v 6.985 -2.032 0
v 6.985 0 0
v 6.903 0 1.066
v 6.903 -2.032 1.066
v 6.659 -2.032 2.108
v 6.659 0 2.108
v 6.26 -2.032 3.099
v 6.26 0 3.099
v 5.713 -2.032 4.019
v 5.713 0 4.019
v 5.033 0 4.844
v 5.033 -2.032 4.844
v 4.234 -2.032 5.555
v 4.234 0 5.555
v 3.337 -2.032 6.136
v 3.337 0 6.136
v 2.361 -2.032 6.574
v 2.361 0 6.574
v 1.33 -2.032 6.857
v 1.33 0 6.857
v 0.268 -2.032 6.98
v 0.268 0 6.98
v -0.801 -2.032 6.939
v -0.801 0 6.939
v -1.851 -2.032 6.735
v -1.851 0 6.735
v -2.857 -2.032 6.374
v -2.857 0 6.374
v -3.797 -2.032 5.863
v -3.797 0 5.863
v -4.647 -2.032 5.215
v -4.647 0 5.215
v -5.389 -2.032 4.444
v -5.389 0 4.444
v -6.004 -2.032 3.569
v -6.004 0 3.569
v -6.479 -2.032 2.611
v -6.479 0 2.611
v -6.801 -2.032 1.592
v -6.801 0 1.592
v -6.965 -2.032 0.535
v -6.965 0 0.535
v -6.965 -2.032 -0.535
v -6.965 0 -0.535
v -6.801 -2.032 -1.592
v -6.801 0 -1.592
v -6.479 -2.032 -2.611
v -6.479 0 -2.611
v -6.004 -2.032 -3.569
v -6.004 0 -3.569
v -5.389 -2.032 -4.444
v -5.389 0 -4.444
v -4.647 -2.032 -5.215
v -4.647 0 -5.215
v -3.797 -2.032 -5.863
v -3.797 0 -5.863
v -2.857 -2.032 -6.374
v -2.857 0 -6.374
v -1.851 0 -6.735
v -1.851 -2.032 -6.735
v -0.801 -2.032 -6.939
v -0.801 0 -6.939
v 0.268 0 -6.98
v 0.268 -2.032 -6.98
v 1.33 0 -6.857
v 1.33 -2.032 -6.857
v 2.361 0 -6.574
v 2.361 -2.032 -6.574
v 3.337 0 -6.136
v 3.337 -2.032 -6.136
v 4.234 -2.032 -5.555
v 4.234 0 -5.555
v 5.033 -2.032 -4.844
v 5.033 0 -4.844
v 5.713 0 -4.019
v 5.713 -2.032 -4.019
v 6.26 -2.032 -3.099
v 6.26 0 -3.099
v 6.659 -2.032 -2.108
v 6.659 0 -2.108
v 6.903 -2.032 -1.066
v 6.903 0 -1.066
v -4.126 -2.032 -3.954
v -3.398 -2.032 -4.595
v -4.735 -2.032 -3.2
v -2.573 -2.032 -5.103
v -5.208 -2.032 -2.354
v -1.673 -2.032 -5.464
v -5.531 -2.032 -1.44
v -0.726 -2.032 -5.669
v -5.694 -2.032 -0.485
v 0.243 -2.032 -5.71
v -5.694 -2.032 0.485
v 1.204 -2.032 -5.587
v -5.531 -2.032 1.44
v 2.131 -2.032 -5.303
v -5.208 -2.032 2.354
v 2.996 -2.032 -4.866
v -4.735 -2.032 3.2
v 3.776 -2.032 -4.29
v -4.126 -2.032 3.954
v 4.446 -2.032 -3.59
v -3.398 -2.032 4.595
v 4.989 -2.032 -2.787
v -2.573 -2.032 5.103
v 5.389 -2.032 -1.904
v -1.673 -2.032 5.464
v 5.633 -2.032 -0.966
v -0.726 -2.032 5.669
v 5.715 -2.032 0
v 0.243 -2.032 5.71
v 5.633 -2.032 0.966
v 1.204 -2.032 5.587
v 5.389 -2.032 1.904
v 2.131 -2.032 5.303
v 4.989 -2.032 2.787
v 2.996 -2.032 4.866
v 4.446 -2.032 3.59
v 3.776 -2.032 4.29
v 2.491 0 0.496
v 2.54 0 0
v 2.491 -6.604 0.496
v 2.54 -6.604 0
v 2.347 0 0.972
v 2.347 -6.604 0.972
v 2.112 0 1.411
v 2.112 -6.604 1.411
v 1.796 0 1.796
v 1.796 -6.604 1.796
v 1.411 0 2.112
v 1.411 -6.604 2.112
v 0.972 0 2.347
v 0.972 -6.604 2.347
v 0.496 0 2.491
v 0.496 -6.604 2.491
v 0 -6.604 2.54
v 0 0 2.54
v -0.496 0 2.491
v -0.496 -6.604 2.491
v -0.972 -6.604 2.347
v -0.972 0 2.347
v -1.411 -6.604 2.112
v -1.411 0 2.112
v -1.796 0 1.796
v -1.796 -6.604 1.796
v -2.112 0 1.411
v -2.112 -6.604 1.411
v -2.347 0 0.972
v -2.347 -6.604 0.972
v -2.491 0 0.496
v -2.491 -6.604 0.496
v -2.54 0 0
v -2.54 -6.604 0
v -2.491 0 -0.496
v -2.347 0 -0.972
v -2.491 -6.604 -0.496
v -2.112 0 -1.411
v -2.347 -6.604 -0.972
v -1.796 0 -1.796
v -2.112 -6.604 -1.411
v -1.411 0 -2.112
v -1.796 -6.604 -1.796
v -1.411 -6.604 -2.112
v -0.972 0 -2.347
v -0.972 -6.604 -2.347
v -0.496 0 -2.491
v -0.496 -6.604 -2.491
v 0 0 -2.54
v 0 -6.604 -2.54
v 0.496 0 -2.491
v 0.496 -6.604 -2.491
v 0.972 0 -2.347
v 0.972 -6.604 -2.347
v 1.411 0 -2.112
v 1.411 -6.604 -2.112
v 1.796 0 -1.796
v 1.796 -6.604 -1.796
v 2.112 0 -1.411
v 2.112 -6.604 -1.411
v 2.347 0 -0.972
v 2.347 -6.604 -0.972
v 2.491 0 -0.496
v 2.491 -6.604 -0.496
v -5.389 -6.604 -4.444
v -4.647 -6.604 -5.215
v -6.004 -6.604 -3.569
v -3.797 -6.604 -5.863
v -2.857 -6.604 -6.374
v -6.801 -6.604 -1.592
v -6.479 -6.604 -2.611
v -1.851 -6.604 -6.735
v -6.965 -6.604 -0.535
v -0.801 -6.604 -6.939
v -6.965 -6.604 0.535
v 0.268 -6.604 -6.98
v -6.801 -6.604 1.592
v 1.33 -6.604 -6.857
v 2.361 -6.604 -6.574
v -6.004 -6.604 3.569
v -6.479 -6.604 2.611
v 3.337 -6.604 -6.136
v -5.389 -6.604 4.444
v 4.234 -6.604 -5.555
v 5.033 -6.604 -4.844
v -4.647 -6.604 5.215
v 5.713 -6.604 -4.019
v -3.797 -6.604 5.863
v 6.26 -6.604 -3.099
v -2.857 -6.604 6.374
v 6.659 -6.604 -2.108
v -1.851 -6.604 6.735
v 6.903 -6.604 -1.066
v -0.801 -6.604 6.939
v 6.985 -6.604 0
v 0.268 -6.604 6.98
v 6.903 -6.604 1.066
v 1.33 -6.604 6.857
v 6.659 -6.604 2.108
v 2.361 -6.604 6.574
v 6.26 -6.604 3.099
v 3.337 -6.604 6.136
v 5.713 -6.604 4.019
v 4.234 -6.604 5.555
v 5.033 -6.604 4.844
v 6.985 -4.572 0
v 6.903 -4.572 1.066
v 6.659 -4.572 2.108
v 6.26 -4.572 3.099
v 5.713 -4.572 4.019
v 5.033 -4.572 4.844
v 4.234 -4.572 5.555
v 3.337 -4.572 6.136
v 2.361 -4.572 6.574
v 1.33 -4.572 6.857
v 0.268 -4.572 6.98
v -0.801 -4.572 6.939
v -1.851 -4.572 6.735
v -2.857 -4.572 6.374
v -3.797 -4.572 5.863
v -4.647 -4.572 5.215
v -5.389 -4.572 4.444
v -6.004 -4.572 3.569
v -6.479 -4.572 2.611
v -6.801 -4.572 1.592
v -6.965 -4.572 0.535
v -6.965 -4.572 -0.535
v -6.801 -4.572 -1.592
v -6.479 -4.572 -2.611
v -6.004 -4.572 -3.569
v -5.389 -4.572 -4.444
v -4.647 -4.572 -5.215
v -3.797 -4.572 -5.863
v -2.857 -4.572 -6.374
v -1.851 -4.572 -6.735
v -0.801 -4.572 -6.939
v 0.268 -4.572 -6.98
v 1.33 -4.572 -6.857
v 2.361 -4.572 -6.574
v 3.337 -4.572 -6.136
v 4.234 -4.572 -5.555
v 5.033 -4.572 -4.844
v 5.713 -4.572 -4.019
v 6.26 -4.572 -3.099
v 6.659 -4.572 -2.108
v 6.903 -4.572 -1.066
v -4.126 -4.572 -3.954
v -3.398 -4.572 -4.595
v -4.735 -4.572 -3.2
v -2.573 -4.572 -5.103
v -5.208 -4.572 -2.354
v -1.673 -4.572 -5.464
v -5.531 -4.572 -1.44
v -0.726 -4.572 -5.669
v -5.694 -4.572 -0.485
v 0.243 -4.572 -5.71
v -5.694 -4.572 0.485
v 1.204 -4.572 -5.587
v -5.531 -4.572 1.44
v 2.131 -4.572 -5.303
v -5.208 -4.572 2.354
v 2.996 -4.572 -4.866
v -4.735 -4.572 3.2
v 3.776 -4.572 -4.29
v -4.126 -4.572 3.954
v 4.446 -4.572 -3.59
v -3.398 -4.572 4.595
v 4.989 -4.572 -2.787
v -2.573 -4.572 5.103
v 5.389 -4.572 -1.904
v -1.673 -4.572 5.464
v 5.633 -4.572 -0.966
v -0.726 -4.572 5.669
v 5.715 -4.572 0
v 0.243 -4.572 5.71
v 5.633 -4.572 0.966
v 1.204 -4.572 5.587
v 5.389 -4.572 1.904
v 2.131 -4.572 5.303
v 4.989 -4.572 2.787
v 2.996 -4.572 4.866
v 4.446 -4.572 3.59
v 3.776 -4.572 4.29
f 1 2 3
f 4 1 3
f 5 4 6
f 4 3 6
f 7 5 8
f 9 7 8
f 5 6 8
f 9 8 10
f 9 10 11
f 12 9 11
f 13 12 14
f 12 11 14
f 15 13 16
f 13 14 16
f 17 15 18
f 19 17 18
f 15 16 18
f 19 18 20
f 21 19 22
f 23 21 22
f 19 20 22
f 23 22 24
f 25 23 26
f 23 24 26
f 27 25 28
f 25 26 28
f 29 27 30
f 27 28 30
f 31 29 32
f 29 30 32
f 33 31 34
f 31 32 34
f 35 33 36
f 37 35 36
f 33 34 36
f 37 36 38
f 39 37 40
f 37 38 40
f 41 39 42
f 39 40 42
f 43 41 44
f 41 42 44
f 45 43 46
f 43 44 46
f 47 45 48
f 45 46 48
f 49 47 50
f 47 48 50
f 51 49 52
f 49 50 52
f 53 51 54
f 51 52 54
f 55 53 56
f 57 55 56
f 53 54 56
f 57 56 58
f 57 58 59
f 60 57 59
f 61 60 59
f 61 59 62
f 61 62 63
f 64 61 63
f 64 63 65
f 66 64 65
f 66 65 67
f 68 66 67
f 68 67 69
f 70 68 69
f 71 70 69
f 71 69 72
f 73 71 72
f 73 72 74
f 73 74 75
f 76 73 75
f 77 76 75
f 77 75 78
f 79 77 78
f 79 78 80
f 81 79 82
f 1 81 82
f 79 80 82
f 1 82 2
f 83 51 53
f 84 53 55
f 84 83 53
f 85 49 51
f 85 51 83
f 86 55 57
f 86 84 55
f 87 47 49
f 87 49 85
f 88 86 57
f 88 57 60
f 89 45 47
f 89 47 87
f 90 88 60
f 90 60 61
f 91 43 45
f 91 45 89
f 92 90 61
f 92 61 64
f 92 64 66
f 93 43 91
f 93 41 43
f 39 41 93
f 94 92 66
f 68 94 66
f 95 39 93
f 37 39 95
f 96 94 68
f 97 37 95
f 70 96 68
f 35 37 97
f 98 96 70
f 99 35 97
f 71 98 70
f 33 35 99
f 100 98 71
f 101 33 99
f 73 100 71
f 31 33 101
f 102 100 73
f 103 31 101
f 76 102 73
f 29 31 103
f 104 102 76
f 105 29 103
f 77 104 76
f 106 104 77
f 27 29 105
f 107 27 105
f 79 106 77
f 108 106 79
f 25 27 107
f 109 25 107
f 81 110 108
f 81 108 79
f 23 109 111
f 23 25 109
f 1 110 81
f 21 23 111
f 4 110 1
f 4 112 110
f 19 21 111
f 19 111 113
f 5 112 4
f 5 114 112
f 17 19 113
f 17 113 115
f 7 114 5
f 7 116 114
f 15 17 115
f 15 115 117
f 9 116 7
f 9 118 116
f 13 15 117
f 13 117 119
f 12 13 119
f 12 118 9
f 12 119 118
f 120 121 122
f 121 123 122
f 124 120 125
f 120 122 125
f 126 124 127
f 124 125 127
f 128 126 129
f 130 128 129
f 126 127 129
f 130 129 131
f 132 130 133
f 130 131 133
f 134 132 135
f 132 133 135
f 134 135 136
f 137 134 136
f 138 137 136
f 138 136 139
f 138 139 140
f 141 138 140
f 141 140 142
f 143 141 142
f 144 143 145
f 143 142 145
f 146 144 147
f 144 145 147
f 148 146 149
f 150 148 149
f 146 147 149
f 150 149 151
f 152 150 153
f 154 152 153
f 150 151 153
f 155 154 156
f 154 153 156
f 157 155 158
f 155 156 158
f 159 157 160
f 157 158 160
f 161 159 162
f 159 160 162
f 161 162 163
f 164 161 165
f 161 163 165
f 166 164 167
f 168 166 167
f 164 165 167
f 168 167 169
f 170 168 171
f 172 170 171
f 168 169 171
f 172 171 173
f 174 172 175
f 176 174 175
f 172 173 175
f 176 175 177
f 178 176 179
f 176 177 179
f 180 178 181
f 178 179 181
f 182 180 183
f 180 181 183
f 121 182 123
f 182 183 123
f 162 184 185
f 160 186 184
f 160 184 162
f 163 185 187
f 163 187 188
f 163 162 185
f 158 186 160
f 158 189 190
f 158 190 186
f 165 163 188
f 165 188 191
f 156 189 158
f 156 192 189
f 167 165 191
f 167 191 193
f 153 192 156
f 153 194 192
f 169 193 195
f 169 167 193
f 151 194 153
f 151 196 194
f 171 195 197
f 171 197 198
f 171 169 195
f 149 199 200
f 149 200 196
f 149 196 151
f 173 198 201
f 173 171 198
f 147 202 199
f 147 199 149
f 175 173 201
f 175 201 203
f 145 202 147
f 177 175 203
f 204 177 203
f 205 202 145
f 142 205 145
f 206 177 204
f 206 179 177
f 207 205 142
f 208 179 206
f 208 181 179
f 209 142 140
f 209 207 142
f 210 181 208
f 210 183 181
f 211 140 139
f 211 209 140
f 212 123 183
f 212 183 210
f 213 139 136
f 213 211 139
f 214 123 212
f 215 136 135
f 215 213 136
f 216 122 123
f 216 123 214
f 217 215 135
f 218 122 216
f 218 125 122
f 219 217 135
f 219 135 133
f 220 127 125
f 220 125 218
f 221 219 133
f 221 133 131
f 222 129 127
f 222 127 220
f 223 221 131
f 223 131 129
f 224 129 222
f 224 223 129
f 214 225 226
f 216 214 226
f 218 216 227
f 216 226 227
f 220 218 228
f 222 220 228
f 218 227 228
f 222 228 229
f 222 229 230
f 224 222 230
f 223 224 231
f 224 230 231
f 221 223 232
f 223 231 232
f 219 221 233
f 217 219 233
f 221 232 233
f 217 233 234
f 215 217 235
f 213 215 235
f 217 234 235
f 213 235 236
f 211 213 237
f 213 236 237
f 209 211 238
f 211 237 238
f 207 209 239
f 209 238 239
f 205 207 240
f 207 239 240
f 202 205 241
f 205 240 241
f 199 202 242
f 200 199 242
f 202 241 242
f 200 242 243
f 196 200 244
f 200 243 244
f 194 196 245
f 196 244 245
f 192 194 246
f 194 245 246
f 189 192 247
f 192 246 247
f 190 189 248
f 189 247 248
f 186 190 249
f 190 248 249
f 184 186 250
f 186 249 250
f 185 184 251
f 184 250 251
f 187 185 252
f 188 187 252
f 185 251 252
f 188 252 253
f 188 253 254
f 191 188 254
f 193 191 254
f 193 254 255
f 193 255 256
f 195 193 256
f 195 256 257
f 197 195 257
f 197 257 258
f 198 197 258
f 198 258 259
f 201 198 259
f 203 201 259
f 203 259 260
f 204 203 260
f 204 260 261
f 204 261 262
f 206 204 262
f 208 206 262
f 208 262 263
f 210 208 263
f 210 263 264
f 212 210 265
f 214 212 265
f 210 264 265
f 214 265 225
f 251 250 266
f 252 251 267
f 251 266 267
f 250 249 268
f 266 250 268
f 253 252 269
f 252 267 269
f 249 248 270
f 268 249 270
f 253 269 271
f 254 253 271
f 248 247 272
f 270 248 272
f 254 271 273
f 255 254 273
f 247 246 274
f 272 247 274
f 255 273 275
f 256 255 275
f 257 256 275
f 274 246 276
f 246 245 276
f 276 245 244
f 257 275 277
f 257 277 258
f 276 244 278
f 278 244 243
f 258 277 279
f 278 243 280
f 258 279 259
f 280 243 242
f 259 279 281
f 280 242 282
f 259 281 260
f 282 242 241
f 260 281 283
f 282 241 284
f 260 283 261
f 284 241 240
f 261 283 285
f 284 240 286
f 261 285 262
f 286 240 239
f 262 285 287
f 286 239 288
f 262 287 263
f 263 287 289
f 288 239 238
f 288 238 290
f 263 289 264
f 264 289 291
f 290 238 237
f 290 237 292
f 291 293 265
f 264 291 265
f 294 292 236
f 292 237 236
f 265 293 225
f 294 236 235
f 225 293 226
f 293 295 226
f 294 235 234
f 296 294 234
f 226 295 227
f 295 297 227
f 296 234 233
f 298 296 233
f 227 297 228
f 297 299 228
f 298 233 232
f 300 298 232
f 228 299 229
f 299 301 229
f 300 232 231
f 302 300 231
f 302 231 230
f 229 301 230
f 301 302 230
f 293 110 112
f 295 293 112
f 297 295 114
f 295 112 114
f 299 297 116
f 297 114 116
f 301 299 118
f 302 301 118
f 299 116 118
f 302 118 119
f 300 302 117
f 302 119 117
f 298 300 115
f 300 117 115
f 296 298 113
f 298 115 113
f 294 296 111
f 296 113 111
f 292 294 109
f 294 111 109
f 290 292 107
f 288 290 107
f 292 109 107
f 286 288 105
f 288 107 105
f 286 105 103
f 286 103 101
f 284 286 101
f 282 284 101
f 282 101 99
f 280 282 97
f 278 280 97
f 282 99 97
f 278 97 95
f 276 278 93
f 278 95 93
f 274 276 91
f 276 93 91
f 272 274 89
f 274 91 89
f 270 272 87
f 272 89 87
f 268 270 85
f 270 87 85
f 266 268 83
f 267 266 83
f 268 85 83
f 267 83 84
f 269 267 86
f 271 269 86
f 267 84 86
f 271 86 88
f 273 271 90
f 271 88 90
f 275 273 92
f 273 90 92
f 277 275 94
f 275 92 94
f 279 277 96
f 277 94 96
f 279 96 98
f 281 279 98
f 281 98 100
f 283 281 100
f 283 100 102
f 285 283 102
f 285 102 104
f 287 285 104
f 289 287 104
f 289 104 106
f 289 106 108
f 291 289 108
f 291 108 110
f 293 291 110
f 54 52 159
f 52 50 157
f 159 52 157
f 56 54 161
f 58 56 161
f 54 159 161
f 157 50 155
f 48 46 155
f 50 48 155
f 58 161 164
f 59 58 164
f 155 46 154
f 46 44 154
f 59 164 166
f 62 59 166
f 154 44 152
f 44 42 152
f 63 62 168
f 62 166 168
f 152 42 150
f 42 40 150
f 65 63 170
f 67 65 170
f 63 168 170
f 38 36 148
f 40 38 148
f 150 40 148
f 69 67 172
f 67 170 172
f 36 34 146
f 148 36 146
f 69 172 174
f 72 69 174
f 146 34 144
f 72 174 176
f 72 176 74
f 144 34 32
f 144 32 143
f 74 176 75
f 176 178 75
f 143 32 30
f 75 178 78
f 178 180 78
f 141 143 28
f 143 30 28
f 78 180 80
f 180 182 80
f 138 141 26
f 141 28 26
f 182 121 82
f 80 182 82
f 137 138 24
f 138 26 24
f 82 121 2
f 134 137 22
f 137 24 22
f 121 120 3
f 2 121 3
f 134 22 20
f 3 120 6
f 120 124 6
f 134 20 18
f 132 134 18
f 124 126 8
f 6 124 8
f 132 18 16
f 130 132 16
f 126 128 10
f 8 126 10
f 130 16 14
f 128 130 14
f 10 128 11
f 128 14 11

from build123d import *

# Parameters (mm, degrees)
F0_R     = 6.985
F1_DEPTH = 2.032
F2_R     = 5.715
F3_DEPTH = 2.54
F4_R     = 6.985
F5_DEPTH = 2.032
F6_R     = 2.54
F7_DEPTH = 12.7


with BuildPart() as f1:
    # F0 (on Front) → F1 (new body)
    with BuildSketch(Plane.XZ):
        Circle(F0_R)
    extrude(amount=F1_DEPTH)

    # F2 (on face) → F3 (join)
    with BuildSketch(Plane.XZ.offset(2.032)):
        Circle(F2_R)
    extrude(amount=F3_DEPTH)

    # F4 (on face) → F5 (join)
    with BuildSketch(Plane.XZ.offset(4.572)):
        Circle(F4_R)
    extrude(amount=F5_DEPTH)

    # F6 (on face) → F7 (cut, symmetric)
    with BuildSketch(Plane.XZ.offset(6.604)):
        Circle(F6_R)
    extrude(amount=F7_DEPTH, both=True, mode=Mode.SUBTRACT)


solid = f1.part
